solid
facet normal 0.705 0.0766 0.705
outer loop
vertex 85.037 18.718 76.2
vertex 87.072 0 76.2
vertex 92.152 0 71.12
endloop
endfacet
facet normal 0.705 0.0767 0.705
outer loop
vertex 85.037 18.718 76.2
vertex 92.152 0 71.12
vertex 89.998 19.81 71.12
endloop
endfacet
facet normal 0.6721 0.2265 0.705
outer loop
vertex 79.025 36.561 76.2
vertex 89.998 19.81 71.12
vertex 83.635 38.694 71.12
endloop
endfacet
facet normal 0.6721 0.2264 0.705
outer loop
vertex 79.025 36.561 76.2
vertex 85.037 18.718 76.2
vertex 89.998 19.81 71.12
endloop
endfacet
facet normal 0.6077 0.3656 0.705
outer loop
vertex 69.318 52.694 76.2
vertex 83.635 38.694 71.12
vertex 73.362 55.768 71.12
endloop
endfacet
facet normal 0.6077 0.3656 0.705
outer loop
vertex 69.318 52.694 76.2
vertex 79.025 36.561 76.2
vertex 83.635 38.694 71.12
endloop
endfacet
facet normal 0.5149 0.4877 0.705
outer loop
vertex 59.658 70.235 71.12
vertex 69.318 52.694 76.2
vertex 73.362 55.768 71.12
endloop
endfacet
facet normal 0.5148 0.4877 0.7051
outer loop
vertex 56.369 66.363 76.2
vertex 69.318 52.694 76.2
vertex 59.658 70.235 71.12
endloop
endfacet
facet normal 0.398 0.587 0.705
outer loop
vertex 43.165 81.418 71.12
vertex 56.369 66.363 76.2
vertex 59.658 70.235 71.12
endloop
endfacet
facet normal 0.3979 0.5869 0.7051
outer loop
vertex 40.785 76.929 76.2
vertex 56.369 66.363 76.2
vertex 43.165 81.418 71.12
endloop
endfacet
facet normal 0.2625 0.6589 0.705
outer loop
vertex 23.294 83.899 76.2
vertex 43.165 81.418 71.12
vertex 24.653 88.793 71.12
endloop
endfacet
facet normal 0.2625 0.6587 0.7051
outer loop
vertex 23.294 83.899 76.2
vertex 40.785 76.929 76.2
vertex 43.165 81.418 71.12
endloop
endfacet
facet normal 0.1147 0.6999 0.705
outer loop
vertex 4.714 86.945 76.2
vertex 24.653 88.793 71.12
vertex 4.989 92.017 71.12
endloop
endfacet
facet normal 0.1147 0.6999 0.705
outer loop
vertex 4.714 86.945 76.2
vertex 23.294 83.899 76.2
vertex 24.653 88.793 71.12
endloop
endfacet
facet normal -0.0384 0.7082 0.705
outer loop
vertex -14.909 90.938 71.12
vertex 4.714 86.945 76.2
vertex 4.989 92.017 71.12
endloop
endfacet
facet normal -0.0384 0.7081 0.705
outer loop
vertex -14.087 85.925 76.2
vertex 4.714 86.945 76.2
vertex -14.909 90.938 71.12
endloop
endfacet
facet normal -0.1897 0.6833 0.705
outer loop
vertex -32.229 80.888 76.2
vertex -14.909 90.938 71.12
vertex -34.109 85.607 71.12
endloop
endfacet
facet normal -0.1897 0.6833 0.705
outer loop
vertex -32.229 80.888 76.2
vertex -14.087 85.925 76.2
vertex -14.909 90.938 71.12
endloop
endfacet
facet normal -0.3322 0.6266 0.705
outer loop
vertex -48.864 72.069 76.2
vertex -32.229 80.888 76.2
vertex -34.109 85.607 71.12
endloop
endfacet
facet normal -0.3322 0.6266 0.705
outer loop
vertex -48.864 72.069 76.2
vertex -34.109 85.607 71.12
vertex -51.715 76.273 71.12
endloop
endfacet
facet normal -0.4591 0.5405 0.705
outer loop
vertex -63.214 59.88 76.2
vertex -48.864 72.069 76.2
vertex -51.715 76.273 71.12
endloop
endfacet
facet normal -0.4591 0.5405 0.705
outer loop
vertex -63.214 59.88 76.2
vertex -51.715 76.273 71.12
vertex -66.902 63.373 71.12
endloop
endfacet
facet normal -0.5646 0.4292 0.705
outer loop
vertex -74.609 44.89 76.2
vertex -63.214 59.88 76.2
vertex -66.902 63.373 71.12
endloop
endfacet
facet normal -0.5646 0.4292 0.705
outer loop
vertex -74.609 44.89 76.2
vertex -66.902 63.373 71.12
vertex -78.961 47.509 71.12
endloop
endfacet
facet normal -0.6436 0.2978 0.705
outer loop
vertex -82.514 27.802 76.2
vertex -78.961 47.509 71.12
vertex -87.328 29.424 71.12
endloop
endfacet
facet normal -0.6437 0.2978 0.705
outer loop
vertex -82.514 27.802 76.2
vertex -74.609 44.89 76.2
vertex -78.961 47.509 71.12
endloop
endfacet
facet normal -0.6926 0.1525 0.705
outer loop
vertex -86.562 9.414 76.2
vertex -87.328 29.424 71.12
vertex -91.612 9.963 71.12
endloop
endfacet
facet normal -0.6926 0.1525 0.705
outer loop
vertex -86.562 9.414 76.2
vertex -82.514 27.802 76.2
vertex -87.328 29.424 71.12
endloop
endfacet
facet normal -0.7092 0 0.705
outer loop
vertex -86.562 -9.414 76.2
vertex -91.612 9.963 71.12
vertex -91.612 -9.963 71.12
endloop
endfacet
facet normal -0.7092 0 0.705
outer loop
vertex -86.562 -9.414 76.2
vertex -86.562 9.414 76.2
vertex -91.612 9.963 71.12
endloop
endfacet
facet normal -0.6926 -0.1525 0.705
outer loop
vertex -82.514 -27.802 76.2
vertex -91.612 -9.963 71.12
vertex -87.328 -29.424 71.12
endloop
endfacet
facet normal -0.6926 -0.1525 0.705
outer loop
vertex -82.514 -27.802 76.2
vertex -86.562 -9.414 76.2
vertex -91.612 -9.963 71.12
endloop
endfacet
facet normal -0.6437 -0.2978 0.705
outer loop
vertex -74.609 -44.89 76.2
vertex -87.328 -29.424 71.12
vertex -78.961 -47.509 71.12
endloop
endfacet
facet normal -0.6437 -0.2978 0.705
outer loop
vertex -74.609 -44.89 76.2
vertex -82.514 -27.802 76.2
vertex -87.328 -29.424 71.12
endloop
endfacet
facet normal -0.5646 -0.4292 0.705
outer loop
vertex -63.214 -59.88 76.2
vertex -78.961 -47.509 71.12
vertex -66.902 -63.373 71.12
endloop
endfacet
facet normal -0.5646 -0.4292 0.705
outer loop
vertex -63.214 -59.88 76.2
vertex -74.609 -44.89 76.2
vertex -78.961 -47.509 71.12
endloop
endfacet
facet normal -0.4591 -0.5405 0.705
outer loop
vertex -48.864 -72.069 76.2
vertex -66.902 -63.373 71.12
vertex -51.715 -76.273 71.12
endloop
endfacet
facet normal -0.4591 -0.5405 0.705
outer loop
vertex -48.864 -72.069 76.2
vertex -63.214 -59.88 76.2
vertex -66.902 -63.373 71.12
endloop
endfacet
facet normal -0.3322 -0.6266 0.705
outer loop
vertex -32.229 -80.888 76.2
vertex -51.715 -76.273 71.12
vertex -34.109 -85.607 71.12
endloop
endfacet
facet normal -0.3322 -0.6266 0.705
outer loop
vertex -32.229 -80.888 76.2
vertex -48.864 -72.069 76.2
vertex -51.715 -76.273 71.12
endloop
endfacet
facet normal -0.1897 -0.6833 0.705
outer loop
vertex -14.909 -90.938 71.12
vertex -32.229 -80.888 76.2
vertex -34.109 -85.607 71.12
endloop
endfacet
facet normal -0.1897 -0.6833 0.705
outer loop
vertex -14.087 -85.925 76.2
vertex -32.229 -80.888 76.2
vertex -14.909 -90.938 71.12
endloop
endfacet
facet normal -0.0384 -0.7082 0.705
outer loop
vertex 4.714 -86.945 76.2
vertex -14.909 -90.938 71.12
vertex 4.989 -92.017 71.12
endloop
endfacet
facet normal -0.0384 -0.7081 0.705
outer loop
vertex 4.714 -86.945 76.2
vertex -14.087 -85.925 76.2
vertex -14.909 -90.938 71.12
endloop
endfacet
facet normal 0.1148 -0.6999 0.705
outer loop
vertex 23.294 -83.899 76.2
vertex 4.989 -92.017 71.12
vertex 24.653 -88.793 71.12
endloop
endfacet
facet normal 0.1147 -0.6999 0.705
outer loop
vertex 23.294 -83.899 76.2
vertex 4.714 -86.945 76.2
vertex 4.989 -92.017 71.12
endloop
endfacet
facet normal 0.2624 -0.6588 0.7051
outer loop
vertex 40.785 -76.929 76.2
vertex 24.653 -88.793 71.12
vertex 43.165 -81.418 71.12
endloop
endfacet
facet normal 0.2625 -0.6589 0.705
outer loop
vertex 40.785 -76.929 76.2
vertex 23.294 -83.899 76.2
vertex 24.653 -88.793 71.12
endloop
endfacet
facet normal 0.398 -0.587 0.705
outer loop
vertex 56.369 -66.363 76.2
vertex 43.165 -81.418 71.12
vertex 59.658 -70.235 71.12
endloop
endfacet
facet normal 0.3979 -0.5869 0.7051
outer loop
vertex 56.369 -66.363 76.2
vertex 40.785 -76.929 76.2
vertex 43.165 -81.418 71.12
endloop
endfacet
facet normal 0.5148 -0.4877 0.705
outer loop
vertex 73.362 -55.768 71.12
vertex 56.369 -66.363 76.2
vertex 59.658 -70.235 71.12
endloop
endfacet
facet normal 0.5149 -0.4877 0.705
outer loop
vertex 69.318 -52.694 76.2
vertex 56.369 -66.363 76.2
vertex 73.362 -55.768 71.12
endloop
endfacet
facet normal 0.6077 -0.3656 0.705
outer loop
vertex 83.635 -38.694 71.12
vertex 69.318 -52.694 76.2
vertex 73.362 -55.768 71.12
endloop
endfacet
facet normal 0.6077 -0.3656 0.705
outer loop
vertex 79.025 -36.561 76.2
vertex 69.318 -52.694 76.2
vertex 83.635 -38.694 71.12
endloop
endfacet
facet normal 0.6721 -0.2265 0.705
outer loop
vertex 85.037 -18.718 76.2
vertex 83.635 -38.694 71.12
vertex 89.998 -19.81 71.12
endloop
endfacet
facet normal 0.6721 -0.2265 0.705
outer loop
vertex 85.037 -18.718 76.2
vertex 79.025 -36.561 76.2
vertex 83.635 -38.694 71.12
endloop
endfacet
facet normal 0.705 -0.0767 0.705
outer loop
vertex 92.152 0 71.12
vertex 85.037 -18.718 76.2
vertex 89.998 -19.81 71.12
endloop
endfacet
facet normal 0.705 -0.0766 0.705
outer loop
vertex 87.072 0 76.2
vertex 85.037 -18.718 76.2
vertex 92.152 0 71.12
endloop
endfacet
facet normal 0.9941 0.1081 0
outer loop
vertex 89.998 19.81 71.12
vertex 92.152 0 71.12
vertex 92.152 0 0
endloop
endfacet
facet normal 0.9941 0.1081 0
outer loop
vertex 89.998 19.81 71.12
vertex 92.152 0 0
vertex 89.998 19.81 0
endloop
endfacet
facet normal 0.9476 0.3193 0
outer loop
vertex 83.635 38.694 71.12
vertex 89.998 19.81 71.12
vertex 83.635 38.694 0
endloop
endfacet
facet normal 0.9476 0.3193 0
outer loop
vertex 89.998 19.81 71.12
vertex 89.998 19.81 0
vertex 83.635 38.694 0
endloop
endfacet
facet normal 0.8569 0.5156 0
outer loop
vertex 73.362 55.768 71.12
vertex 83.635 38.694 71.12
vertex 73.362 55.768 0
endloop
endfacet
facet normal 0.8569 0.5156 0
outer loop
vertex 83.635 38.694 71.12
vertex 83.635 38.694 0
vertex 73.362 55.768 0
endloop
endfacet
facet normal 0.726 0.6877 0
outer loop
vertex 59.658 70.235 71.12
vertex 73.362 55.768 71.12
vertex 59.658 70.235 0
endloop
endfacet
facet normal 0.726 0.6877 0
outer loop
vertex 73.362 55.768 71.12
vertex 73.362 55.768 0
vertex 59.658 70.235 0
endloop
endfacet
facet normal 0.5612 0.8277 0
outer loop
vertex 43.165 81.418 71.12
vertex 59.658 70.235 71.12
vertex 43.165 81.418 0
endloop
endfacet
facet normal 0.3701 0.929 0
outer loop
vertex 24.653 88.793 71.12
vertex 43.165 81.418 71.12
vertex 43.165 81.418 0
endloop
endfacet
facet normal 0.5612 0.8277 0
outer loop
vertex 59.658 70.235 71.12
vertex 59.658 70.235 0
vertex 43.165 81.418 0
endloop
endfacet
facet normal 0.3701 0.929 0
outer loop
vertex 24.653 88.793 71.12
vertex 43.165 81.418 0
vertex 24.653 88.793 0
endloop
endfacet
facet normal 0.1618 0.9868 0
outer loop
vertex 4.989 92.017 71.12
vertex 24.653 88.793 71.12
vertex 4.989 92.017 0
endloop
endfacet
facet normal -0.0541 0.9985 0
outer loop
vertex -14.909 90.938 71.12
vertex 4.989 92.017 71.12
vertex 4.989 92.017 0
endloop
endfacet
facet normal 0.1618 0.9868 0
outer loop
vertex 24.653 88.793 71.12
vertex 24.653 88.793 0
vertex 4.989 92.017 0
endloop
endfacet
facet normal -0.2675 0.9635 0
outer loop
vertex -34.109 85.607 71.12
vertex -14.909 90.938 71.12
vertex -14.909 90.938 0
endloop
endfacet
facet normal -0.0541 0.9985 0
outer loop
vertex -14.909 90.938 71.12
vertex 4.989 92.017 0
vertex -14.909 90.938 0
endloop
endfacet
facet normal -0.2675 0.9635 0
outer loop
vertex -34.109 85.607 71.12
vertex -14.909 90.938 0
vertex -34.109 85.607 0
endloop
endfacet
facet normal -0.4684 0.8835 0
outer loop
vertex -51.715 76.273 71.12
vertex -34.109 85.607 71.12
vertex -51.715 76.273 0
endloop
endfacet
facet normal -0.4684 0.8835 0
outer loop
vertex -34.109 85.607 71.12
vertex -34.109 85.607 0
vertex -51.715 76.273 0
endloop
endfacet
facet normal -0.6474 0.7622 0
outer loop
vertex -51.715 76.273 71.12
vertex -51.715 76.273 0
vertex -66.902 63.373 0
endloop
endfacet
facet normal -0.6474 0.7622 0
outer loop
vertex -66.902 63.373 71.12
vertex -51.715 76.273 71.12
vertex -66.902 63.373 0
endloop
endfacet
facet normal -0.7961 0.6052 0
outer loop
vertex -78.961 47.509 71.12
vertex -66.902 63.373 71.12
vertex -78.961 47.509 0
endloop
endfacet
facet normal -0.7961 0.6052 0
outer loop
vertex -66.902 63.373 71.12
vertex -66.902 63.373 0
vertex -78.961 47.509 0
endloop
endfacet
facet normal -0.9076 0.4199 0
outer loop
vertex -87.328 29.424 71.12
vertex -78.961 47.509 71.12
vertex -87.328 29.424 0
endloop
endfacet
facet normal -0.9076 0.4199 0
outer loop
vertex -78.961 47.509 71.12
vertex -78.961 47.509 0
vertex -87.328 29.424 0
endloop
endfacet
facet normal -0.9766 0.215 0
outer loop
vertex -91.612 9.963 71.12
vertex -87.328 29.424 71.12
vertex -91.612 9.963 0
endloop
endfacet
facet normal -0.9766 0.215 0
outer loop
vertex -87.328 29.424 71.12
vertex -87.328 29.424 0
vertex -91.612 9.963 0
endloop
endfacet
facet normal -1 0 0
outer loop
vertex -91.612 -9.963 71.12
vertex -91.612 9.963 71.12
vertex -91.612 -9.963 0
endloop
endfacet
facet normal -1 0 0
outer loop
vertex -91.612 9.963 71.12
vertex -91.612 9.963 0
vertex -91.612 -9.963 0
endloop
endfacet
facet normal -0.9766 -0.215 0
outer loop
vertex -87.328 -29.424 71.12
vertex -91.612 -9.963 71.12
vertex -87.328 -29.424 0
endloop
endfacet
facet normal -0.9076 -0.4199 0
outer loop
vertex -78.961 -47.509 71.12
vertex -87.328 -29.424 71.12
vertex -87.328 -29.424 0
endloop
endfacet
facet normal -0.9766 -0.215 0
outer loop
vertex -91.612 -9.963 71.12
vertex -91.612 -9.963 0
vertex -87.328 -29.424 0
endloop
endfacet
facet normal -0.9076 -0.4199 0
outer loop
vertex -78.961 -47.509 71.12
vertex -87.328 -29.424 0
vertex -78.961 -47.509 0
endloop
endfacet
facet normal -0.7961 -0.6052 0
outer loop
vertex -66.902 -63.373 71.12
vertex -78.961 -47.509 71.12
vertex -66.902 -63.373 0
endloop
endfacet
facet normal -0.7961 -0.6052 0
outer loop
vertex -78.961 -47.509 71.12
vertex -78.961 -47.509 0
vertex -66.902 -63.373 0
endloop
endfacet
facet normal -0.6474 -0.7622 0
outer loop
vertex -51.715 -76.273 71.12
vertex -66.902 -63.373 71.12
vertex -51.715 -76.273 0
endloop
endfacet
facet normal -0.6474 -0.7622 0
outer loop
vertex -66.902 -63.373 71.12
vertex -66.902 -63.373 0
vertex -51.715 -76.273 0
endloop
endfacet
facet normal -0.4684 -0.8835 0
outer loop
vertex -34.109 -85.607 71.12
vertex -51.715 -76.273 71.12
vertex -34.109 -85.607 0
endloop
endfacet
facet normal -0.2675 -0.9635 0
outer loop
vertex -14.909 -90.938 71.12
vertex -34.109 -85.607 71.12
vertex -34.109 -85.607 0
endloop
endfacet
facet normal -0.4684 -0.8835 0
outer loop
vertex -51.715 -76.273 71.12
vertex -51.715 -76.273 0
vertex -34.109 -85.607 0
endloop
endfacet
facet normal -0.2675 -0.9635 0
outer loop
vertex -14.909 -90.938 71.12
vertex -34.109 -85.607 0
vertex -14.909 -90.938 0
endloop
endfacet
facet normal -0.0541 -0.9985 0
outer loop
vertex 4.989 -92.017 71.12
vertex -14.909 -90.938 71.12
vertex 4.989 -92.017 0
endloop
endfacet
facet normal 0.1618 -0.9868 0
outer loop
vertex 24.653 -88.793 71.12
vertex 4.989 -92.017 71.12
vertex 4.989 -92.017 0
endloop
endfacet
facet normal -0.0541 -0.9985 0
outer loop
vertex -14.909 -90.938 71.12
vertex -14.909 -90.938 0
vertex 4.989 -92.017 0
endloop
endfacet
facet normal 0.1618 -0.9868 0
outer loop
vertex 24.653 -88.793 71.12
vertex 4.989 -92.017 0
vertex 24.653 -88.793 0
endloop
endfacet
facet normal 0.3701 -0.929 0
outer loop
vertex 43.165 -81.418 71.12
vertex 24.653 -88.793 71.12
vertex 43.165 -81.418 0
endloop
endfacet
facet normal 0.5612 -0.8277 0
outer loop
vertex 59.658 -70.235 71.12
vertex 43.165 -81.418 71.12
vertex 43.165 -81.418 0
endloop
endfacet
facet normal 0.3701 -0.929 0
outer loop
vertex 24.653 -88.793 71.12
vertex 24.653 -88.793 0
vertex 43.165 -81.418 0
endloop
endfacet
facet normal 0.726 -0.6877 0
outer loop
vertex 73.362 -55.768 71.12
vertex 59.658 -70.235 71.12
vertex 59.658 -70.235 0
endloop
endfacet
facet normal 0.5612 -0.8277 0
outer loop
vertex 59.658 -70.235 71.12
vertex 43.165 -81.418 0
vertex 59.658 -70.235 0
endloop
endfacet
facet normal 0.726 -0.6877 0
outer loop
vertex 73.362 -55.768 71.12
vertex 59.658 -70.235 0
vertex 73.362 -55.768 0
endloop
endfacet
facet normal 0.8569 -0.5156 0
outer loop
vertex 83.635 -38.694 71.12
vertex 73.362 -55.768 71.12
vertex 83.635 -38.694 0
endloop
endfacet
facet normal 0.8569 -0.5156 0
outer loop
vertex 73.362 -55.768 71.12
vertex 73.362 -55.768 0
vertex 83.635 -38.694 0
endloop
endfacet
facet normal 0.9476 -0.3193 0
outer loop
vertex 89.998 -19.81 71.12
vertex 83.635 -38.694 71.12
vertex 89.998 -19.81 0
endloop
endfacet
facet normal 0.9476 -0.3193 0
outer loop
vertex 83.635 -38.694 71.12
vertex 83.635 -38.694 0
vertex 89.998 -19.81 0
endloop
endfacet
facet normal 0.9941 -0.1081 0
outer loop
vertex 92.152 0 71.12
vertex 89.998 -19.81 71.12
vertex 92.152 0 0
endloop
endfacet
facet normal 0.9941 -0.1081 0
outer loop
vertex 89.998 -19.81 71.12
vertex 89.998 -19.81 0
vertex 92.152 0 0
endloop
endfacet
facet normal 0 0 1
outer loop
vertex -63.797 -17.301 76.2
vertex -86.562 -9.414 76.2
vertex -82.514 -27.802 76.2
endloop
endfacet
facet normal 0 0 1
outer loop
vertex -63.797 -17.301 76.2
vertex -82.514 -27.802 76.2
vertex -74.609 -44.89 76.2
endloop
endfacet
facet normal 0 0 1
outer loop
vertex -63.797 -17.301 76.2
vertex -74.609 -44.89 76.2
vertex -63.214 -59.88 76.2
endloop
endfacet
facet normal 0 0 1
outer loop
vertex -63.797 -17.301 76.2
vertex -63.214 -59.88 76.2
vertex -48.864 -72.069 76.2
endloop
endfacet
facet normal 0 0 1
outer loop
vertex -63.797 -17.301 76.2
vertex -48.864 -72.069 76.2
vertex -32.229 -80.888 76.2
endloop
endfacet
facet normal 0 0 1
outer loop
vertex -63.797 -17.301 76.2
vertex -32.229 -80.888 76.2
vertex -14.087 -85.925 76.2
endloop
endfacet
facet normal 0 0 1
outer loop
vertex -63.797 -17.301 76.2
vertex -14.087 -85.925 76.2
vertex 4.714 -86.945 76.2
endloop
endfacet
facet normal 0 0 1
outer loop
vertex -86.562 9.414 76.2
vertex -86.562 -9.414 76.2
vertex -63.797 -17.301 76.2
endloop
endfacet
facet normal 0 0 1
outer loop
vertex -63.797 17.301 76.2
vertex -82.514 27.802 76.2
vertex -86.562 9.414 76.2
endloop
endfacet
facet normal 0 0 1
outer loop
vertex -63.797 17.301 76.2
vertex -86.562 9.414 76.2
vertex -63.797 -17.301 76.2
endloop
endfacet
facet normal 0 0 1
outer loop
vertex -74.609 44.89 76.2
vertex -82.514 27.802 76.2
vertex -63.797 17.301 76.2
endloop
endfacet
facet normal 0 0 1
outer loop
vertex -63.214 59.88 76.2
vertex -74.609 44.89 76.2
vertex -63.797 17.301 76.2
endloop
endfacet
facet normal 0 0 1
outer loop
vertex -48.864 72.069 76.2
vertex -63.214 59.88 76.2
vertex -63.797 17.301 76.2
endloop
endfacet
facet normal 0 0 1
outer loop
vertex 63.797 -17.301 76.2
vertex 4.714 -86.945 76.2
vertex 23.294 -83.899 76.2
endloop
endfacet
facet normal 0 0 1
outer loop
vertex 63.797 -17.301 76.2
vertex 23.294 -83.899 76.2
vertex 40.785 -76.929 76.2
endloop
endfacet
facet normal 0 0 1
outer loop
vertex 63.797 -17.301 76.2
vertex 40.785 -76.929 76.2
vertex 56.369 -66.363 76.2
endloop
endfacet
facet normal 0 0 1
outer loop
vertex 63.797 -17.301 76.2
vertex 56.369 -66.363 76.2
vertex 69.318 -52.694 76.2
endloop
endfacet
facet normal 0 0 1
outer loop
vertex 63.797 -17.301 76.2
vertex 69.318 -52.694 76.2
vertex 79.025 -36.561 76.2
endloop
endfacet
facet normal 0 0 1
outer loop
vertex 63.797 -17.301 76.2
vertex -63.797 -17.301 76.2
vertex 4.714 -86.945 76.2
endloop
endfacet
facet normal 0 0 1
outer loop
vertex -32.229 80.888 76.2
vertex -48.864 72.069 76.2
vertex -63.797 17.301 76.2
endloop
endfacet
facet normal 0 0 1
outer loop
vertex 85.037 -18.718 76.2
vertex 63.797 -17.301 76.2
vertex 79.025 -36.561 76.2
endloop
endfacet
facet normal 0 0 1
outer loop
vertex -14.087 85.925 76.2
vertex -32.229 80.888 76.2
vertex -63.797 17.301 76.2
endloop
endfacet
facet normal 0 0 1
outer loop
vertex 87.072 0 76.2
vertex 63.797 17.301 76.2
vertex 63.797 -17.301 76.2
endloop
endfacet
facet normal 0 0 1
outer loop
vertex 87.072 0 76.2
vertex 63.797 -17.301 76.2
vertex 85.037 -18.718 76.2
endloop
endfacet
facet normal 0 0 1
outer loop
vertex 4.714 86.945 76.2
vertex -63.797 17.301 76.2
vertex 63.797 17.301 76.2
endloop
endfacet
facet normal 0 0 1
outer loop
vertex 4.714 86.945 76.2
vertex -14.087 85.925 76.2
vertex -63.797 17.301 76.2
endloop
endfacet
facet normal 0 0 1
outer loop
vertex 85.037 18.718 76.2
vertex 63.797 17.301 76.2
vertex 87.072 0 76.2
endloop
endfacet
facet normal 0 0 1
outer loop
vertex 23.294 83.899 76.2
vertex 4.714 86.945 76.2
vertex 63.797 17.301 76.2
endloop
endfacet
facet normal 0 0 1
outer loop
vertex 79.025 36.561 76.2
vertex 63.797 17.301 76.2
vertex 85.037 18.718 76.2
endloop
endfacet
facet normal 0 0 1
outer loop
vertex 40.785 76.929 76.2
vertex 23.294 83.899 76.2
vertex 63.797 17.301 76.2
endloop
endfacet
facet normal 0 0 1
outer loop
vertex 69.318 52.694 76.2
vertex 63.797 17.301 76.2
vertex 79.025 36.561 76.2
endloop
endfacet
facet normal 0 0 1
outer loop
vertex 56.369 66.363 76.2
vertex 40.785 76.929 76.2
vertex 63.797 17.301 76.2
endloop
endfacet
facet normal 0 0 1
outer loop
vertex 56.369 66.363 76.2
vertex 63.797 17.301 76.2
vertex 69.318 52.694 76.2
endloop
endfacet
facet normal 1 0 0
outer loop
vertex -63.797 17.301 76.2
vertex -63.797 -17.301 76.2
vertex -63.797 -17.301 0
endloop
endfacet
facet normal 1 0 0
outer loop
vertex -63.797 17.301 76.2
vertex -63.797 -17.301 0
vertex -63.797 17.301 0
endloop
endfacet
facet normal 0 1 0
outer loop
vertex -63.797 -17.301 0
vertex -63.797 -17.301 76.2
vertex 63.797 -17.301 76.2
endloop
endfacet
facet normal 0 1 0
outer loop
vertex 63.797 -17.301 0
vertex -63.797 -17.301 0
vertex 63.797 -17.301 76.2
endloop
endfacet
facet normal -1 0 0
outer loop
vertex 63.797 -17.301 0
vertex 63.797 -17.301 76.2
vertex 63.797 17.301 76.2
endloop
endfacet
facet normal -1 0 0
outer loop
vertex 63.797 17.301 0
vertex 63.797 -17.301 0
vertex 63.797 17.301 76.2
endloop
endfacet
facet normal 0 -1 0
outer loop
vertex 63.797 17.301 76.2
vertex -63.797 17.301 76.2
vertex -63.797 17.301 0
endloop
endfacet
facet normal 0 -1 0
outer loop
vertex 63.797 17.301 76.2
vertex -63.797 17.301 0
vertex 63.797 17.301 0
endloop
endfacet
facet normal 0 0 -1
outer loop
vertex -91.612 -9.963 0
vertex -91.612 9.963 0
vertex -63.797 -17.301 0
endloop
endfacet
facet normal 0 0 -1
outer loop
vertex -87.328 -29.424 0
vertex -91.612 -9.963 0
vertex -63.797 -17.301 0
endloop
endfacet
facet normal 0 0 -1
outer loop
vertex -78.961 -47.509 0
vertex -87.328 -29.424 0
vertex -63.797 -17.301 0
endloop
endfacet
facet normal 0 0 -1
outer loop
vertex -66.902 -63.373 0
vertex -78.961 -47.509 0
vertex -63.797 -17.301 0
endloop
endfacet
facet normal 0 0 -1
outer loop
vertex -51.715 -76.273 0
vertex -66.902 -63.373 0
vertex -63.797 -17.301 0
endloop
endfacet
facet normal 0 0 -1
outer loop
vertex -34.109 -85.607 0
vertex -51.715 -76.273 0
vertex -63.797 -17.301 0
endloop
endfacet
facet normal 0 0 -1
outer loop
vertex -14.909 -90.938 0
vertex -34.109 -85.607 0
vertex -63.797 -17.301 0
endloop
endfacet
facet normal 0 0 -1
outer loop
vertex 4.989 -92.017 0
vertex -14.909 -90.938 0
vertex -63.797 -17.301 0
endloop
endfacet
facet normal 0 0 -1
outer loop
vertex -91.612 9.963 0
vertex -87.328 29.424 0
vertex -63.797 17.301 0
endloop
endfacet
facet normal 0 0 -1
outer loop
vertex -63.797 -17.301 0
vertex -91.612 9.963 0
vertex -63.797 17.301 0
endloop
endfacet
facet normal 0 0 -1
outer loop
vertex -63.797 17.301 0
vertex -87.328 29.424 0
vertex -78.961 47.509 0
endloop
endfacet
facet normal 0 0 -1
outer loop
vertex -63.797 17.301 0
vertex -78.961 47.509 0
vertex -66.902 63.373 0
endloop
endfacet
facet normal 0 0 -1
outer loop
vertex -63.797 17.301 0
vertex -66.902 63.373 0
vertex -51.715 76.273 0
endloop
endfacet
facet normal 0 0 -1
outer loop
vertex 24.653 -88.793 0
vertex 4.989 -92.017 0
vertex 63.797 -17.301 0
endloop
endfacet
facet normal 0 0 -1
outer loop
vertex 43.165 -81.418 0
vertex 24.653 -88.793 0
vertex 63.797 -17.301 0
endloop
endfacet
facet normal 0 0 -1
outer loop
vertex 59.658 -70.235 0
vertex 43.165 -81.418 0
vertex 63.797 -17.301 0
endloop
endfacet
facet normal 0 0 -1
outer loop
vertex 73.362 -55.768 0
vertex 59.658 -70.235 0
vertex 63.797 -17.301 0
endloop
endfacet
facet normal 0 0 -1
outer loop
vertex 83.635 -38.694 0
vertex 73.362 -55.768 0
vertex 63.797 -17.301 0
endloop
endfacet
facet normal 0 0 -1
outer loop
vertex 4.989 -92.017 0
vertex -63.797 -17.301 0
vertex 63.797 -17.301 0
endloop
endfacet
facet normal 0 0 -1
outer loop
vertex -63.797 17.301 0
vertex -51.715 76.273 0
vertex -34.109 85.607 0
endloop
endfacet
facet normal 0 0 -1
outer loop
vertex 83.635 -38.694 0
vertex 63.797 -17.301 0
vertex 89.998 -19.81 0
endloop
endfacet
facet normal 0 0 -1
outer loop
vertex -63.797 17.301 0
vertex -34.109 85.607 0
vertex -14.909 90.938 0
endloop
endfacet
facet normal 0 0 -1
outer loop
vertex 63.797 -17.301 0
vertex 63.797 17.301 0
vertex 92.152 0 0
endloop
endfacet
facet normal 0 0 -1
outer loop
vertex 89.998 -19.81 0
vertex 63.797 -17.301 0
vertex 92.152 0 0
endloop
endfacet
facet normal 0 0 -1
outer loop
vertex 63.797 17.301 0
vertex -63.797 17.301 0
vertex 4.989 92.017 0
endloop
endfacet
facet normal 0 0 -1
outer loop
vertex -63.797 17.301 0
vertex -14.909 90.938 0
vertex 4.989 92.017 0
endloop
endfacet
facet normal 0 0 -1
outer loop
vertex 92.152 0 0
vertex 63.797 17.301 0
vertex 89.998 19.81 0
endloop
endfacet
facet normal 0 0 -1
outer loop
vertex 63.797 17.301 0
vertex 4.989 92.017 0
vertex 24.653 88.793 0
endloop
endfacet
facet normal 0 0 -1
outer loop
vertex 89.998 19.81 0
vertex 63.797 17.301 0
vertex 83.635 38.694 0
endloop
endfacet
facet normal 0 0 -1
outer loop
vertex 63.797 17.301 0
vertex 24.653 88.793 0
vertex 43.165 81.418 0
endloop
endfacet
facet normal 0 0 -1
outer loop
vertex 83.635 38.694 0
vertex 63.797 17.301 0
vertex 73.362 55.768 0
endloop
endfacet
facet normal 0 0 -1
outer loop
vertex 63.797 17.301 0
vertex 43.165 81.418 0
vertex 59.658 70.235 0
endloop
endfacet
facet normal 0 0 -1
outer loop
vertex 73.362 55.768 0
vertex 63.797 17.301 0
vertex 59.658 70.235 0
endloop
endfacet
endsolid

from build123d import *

# Parameters (mm, degrees)
F0_R     = 92.15231
F1_DEPTH = 76.2
F2_SIZE  = 5.08
F3_W     = 127.593874
F3_H     = 34.602892
F4_DEPTH = 115.57


with BuildPart() as f1:
    # F0 (on Top) → F1 (new body)
    with BuildSketch(Plane.XY):
        Circle(F0_R)
    extrude(amount=F1_DEPTH)

    # F2
    f2_edges = [f1.edges().sort_by_distance(p)[0] for p in [
        (-92.15231, 0, 76.2),
    ]]
    chamfer(f2_edges, length=F2_SIZE)

    # F3 (on face) → F4 (cut)
    with BuildSketch(Plane.XY.offset(76.2)):
        Rectangle(F3_W, F3_H)
    extrude(amount=-F4_DEPTH, mode=Mode.SUBTRACT)


solid = f1.part
